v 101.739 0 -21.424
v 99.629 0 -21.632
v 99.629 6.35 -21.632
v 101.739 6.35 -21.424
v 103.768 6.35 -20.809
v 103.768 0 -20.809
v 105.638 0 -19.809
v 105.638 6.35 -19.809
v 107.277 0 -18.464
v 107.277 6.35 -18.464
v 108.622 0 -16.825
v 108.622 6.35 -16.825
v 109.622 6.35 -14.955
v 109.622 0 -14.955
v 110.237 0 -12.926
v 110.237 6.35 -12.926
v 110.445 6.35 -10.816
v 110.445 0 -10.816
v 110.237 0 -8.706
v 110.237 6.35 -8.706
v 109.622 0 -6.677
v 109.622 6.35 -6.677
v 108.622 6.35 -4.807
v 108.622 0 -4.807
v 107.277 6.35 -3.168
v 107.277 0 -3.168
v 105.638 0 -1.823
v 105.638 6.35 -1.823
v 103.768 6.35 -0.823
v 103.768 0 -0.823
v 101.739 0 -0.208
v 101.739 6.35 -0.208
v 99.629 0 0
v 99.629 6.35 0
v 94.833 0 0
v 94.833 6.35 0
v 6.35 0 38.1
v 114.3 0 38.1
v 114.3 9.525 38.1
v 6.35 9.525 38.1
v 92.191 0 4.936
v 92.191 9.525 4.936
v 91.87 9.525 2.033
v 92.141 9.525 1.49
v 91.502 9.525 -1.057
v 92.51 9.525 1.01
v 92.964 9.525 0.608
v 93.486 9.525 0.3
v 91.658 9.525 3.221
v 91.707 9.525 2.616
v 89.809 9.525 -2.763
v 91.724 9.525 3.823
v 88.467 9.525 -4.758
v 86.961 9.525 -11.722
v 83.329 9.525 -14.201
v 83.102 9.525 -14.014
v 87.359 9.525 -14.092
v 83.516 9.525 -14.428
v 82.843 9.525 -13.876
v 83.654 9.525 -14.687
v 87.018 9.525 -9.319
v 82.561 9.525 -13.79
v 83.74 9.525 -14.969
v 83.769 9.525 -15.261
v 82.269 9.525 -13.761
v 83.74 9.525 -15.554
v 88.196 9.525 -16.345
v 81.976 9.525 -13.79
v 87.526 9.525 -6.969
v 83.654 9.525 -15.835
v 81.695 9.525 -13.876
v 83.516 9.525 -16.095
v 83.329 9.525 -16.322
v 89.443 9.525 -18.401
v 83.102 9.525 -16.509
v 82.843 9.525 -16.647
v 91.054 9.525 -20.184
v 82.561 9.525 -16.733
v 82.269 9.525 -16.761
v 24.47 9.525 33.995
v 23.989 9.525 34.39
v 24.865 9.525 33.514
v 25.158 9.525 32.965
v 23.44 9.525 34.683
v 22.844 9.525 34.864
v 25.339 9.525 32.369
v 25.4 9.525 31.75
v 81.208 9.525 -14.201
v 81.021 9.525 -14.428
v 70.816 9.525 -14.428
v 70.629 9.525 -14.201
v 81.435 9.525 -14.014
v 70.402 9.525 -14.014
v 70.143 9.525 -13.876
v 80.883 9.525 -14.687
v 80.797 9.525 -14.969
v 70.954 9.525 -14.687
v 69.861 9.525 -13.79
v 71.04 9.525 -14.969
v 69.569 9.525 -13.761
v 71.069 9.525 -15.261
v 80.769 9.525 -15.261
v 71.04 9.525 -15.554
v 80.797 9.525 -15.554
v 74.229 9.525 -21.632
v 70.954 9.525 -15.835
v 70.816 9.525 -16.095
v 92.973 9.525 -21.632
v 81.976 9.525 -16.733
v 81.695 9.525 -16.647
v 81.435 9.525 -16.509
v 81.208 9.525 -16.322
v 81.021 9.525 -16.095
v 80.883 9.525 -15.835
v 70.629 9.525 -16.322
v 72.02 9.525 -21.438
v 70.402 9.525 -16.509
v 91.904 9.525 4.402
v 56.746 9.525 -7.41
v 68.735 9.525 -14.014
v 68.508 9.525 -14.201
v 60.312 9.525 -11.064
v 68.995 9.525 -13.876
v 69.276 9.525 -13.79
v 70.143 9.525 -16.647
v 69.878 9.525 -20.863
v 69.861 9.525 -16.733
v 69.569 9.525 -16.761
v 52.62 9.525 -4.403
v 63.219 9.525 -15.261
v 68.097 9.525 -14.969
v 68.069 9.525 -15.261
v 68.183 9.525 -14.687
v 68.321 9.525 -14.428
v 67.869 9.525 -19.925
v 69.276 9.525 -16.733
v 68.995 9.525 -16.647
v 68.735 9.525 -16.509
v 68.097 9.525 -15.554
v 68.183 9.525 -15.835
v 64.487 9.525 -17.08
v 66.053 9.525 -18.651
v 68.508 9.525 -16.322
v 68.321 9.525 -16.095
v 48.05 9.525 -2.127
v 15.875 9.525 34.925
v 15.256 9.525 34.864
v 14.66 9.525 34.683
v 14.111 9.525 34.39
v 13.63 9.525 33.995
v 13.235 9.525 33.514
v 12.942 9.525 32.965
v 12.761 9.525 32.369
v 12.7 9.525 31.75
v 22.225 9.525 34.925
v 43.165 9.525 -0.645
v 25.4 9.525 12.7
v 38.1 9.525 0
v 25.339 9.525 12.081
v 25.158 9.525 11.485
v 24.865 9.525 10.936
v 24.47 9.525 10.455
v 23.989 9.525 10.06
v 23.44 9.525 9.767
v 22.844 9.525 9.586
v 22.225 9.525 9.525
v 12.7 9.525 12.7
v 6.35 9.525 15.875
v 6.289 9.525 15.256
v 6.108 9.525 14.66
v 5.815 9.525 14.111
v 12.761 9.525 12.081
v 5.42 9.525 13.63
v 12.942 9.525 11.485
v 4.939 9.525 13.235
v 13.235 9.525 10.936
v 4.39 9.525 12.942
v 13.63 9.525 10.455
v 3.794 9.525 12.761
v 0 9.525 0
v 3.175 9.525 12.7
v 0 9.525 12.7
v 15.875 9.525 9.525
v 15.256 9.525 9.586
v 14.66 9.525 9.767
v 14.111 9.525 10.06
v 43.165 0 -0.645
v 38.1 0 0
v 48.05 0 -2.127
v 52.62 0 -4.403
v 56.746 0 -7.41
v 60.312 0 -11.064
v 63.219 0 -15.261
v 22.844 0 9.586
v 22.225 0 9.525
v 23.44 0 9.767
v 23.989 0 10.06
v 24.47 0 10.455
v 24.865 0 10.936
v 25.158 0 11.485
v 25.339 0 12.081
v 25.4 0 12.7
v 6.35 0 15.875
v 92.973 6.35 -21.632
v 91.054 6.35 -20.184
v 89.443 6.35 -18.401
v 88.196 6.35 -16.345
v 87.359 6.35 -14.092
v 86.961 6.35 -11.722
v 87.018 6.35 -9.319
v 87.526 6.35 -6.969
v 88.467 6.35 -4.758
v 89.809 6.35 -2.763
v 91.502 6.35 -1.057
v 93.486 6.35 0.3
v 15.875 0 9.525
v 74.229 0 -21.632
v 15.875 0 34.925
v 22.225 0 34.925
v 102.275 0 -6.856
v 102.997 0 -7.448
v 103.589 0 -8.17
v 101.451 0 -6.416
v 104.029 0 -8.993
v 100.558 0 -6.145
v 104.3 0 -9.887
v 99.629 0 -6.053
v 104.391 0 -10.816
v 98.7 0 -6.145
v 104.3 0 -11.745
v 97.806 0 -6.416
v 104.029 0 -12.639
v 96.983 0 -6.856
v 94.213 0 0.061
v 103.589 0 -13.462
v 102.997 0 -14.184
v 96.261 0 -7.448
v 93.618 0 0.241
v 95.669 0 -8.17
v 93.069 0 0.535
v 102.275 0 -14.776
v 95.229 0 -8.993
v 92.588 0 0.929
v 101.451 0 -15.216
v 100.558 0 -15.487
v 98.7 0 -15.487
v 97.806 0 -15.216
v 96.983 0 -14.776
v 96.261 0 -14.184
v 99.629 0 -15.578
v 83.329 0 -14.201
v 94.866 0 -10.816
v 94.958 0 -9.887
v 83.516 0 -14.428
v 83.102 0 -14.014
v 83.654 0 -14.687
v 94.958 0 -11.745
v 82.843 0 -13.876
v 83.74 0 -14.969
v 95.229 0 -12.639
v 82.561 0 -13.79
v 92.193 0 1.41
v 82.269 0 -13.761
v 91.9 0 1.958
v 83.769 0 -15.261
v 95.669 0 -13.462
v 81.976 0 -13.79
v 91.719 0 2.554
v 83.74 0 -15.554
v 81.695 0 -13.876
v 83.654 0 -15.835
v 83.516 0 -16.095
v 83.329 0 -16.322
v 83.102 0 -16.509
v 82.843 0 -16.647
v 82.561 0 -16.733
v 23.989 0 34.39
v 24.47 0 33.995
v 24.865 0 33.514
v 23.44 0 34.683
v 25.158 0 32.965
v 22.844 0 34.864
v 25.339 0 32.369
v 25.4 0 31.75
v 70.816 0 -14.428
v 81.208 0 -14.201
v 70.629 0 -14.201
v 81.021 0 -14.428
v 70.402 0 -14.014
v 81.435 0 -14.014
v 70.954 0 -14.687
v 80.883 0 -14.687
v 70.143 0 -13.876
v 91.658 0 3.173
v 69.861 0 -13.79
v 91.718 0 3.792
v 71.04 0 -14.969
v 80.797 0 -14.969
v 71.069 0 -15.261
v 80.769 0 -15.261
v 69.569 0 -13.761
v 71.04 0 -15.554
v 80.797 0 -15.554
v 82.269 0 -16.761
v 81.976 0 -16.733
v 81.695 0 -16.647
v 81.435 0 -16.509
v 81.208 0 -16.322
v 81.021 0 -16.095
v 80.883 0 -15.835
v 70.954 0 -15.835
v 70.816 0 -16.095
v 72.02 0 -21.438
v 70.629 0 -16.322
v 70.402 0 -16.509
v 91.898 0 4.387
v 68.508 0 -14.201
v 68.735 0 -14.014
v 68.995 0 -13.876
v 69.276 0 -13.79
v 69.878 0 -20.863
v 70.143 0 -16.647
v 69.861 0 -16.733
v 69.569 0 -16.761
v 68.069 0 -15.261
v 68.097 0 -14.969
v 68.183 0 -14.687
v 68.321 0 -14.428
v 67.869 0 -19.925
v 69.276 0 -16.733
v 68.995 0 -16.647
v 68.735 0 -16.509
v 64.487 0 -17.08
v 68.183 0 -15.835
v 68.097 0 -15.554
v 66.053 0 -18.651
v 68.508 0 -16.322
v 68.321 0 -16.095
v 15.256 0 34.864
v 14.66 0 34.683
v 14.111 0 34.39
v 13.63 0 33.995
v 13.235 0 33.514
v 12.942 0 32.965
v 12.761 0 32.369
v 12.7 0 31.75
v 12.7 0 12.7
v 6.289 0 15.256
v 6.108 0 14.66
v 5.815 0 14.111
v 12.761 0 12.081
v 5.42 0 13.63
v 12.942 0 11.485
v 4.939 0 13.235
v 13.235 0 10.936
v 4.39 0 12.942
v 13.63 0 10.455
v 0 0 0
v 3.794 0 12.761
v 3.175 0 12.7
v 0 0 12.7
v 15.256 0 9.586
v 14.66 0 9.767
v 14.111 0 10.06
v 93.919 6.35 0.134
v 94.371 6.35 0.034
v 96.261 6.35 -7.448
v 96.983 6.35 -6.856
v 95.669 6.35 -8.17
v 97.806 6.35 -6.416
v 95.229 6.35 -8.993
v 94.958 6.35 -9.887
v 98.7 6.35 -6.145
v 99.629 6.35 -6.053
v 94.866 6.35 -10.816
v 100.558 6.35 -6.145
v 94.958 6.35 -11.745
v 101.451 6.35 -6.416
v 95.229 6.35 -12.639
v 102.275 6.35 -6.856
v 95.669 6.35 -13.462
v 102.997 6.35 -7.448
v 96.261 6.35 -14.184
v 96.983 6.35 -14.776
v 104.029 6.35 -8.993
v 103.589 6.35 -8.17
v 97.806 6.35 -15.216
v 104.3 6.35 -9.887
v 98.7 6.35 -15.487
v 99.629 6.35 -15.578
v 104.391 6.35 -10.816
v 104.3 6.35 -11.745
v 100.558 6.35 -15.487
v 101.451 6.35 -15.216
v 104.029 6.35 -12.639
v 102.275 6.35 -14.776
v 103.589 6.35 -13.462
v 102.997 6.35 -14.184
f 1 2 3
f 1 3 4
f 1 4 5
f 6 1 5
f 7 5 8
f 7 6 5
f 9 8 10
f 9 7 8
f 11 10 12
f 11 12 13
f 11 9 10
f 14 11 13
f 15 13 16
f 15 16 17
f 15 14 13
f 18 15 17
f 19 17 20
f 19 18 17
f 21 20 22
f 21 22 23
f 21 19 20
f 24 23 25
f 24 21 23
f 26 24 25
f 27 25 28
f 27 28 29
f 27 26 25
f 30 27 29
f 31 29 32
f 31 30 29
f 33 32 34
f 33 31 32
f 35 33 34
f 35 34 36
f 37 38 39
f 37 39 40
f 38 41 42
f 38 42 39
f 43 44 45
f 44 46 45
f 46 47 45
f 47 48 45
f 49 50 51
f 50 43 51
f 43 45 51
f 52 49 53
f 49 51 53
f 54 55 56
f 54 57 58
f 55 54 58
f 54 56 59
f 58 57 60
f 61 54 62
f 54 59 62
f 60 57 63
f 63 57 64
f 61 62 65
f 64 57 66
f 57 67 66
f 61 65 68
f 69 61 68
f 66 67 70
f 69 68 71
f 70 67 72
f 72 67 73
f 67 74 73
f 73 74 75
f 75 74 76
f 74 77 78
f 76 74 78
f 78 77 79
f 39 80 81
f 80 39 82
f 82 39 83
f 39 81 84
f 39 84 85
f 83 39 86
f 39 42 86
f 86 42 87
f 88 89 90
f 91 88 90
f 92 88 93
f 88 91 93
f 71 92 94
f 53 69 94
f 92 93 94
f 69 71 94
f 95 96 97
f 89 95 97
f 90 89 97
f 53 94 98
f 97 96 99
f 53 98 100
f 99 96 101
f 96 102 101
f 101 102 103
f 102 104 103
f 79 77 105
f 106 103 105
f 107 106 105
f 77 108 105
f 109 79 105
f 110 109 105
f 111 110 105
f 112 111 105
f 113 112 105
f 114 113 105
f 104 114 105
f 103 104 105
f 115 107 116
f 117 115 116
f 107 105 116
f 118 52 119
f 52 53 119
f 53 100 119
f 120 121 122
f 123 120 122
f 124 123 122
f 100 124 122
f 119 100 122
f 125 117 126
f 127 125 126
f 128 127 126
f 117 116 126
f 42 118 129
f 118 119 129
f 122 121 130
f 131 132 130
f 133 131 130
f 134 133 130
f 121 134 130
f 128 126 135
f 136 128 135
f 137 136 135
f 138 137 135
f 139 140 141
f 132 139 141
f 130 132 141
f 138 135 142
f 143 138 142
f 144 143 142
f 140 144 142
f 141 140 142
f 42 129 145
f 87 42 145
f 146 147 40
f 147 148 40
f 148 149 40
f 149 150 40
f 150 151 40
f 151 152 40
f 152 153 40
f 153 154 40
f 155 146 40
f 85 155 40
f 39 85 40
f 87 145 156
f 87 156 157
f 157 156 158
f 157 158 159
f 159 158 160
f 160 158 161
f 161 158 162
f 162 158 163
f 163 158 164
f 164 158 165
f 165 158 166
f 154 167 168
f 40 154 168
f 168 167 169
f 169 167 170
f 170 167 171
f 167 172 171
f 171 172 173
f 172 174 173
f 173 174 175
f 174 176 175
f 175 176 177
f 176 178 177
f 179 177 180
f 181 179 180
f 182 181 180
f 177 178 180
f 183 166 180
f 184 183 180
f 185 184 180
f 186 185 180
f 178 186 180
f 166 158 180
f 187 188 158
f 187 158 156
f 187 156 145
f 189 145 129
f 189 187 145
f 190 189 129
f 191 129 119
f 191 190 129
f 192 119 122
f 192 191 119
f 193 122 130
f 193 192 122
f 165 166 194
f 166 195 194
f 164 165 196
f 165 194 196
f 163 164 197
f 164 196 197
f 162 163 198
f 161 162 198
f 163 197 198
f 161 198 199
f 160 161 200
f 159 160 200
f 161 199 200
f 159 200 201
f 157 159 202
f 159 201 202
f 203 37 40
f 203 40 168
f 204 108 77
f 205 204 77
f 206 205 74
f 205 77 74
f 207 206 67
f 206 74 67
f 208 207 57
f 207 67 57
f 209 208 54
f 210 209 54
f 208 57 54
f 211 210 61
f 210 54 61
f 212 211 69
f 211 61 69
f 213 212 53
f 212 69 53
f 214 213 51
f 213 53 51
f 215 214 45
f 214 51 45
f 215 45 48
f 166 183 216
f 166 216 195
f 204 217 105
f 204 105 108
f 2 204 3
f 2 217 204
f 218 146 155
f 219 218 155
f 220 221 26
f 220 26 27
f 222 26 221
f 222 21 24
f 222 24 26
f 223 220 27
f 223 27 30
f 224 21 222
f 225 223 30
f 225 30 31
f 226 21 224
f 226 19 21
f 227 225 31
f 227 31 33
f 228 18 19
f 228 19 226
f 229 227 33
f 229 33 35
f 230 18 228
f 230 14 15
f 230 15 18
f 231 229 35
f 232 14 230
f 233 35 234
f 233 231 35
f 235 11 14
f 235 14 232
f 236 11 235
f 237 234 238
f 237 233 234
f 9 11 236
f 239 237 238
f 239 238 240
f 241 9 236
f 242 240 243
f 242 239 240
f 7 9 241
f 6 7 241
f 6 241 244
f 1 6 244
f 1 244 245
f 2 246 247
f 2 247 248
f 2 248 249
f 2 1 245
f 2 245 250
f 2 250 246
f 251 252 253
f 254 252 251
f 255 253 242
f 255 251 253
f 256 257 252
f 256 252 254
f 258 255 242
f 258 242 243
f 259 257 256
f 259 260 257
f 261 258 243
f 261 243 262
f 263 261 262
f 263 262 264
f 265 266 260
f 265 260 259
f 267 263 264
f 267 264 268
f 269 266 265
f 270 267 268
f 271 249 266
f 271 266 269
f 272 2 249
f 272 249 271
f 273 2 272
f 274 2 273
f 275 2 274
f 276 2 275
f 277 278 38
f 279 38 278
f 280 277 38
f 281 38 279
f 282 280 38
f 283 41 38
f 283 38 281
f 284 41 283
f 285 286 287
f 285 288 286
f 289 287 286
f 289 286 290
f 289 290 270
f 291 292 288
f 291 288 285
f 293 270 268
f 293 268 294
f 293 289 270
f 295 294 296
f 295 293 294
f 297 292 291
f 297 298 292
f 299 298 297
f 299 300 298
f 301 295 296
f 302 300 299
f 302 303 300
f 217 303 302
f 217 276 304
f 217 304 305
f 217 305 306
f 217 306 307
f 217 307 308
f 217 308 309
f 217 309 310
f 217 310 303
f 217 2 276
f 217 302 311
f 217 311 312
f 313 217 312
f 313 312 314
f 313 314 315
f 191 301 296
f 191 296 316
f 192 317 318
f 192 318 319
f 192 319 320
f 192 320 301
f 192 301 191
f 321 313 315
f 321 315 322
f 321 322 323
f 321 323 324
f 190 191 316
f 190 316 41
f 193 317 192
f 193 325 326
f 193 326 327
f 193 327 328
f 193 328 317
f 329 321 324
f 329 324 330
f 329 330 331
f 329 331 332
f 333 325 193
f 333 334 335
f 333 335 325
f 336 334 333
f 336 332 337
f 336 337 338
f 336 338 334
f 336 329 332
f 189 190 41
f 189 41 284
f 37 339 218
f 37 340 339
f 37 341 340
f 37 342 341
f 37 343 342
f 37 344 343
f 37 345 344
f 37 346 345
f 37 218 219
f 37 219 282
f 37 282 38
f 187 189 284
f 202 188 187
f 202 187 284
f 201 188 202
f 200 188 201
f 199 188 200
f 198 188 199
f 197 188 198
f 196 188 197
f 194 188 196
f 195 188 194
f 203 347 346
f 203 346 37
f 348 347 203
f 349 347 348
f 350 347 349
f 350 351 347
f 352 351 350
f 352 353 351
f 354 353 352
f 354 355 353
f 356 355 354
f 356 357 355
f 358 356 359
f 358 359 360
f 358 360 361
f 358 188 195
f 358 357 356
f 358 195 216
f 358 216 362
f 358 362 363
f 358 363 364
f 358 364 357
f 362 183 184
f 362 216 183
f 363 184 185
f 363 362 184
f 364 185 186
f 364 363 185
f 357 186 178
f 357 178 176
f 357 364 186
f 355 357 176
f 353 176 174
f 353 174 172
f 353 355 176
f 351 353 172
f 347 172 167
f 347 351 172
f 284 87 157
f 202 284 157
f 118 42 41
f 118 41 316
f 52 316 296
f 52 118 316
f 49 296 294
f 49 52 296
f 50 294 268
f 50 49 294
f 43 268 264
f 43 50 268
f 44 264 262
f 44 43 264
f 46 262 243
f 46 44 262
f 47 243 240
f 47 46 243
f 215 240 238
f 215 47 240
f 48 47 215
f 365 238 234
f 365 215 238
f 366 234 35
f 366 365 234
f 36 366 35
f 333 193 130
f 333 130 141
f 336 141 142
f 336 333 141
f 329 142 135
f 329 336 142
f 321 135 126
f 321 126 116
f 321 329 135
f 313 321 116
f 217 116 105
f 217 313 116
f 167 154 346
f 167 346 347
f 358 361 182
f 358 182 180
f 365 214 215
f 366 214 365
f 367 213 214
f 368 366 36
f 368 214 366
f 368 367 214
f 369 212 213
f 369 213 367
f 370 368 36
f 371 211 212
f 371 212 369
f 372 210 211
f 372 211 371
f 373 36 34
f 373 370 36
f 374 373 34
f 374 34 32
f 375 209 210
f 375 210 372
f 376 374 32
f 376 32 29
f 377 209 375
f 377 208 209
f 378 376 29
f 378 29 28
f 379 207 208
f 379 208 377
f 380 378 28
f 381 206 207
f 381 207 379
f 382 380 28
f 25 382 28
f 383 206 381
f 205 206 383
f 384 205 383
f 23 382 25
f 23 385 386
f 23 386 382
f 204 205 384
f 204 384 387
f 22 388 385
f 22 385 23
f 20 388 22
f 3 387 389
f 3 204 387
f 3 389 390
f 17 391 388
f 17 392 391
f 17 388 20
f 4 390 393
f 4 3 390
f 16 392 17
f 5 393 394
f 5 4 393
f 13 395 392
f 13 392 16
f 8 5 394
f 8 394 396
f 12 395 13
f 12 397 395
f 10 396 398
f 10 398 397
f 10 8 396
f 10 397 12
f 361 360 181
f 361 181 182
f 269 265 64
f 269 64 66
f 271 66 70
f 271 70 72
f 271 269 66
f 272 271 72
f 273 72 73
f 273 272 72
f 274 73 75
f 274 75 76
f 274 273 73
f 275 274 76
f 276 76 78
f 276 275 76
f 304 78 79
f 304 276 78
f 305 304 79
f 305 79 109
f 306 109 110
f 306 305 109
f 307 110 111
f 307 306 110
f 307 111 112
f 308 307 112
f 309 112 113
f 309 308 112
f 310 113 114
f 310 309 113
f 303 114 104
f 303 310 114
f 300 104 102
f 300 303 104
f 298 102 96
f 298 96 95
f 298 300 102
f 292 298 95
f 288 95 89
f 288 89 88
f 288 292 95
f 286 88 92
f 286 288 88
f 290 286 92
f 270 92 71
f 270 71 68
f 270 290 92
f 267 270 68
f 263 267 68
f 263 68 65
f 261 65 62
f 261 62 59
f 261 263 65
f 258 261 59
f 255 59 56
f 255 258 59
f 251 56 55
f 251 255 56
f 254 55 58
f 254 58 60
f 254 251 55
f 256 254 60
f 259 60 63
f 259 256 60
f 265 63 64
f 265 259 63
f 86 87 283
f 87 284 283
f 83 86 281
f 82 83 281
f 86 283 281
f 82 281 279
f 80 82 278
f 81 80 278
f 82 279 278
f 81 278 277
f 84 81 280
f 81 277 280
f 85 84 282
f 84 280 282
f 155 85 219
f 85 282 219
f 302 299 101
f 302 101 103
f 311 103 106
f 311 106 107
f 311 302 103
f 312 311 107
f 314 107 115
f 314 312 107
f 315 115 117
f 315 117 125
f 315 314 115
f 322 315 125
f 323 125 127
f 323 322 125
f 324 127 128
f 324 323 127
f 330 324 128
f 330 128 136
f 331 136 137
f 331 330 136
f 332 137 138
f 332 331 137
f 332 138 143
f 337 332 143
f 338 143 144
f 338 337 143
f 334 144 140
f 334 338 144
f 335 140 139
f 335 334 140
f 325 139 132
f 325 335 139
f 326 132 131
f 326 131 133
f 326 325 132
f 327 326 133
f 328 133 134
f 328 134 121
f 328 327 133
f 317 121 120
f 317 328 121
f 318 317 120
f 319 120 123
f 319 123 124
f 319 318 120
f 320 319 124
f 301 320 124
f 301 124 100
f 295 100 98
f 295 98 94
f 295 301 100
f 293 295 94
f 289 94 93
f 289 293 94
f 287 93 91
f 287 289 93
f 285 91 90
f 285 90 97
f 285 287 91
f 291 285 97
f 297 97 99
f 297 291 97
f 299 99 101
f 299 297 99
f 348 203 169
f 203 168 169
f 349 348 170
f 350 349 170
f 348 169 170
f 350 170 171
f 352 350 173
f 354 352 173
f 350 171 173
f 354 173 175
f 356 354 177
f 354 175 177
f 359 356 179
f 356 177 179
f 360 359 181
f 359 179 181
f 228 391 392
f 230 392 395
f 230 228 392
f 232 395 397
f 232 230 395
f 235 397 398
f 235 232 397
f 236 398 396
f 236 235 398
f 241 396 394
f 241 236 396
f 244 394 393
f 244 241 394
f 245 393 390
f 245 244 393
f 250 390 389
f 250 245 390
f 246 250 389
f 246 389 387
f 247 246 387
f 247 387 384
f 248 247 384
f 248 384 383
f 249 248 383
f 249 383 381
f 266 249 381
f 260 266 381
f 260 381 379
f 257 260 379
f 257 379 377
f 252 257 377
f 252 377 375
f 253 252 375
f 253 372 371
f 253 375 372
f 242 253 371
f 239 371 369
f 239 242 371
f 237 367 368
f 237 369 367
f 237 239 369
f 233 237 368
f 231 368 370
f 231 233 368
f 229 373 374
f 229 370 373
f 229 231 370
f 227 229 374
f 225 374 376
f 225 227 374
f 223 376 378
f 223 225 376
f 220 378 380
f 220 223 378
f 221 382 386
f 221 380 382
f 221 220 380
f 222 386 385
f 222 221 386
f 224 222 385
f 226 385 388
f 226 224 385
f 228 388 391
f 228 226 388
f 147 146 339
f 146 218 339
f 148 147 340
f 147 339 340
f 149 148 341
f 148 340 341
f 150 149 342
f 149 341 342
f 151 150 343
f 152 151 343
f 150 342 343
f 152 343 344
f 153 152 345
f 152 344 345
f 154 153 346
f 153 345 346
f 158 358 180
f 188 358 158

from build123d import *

# Parameters (mm, degrees)
SKETCH1_R           = 4.7625
SKETCH1_R_2         = 1.5
BOSS_EXTRUDE1_DEPTH = 9.525
FILLET1_R           = 3.175
FILLET2_R           = 3.175
SKETCH3_R           = 12.7
CUT_EXTRUDE2_DEPTH  = 3.175
SKETCH4_W           = 12.7
SKETCH4_H           = 25.4
CUT_EXTRUDE3_DEPTH  = 10.525
FILLET3_R           = 3.175


with BuildPart() as part:
    # Sketch1 → Boss-Extrude1 (new body)
    with BuildSketch(Plane(origin=(0, 0, 0), x_dir=(1, 0, 0), z_dir=(0, 1, 0))):
        with BuildLine():
            Line((0, 0), (38.1, 0))
            ThreePointArc((38.1, 0), (52.620300687, 4.403064286), (63.218539249, 15.261399634))
            ThreePointArc((63.218539249, 15.261399634), (67.86863694, 19.924564568), (74.228922018, 21.631986448))
            Line((74.228922018, 21.631986448), (99.628922018, 21.631986448))
            ThreePointArc((99.628922018, 21.631986448), (110.444915242, 10.815993224), (99.628922018, 0))
            Line((99.628922018, 0), (88.9, 0))
            Line((88.9, 0), (114.3, -38.1))
            Line((114.3, -38.1), (6.35, -38.1))
            Line((6.35, -38.1), (6.35, -12.7))
            Line((6.35, -12.7), (0, -12.7))
            Line((0, -12.7), (0, 0))
        make_face()
        with Locations((99.628922018, 10.815993224)):
            Circle(SKETCH1_R, mode=Mode.SUBTRACT)
        with Locations((69.568539249, 15.261399634)):
            Circle(SKETCH1_R_2, mode=Mode.SUBTRACT)
        with Locations((82.268539249, 15.261399634)):
            Circle(SKETCH1_R_2, mode=Mode.SUBTRACT)
    extrude(amount=BOSS_EXTRUDE1_DEPTH)

    # Fillet1
    fillet1_edges = [part.edges().sort_by_distance(p)[0] for p in [
        (88.9, 4.7625, 0),
    ]]
    fillet(fillet1_edges, radius=FILLET1_R)

    # Fillet2
    fillet2_edges = [part.edges().sort_by_distance(p)[0] for p in [
        (6.35, 4.7625, 12.7),
    ]]
    fillet(fillet2_edges, radius=FILLET2_R)

    # Sketch3 → Cut-Extrude2 (cut)
    with BuildSketch(Plane(origin=(0, 9.525, 0), x_dir=(1, 0, 0), z_dir=(0, 1, 0))):
        with Locations((99.628922018, 10.815993224)):
            Circle(SKETCH3_R)
    extrude(amount=-CUT_EXTRUDE2_DEPTH, mode=Mode.SUBTRACT)

    # Sketch4 → Cut-Extrude3 (cut, through all)
    with BuildSketch(Plane(origin=(0, 9.525, 0), x_dir=(1, 0, 0), z_dir=(0, 1, 0))):
        with Locations((19.05, -22.225)):
            Rectangle(SKETCH4_W, SKETCH4_H)
    extrude(amount=-CUT_EXTRUDE3_DEPTH, mode=Mode.SUBTRACT)

    # Fillet3
    fillet3_edges = [part.edges().sort_by_distance(p)[0] for p in [
        (12.7, 4.7625, 9.525),
        (25.4, 4.7625, 9.525),
        (25.4, 4.7625, 34.925),
        (12.7, 4.7625, 34.925),
    ]]
    fillet(fillet3_edges, radius=FILLET3_R)


solid = part.part
